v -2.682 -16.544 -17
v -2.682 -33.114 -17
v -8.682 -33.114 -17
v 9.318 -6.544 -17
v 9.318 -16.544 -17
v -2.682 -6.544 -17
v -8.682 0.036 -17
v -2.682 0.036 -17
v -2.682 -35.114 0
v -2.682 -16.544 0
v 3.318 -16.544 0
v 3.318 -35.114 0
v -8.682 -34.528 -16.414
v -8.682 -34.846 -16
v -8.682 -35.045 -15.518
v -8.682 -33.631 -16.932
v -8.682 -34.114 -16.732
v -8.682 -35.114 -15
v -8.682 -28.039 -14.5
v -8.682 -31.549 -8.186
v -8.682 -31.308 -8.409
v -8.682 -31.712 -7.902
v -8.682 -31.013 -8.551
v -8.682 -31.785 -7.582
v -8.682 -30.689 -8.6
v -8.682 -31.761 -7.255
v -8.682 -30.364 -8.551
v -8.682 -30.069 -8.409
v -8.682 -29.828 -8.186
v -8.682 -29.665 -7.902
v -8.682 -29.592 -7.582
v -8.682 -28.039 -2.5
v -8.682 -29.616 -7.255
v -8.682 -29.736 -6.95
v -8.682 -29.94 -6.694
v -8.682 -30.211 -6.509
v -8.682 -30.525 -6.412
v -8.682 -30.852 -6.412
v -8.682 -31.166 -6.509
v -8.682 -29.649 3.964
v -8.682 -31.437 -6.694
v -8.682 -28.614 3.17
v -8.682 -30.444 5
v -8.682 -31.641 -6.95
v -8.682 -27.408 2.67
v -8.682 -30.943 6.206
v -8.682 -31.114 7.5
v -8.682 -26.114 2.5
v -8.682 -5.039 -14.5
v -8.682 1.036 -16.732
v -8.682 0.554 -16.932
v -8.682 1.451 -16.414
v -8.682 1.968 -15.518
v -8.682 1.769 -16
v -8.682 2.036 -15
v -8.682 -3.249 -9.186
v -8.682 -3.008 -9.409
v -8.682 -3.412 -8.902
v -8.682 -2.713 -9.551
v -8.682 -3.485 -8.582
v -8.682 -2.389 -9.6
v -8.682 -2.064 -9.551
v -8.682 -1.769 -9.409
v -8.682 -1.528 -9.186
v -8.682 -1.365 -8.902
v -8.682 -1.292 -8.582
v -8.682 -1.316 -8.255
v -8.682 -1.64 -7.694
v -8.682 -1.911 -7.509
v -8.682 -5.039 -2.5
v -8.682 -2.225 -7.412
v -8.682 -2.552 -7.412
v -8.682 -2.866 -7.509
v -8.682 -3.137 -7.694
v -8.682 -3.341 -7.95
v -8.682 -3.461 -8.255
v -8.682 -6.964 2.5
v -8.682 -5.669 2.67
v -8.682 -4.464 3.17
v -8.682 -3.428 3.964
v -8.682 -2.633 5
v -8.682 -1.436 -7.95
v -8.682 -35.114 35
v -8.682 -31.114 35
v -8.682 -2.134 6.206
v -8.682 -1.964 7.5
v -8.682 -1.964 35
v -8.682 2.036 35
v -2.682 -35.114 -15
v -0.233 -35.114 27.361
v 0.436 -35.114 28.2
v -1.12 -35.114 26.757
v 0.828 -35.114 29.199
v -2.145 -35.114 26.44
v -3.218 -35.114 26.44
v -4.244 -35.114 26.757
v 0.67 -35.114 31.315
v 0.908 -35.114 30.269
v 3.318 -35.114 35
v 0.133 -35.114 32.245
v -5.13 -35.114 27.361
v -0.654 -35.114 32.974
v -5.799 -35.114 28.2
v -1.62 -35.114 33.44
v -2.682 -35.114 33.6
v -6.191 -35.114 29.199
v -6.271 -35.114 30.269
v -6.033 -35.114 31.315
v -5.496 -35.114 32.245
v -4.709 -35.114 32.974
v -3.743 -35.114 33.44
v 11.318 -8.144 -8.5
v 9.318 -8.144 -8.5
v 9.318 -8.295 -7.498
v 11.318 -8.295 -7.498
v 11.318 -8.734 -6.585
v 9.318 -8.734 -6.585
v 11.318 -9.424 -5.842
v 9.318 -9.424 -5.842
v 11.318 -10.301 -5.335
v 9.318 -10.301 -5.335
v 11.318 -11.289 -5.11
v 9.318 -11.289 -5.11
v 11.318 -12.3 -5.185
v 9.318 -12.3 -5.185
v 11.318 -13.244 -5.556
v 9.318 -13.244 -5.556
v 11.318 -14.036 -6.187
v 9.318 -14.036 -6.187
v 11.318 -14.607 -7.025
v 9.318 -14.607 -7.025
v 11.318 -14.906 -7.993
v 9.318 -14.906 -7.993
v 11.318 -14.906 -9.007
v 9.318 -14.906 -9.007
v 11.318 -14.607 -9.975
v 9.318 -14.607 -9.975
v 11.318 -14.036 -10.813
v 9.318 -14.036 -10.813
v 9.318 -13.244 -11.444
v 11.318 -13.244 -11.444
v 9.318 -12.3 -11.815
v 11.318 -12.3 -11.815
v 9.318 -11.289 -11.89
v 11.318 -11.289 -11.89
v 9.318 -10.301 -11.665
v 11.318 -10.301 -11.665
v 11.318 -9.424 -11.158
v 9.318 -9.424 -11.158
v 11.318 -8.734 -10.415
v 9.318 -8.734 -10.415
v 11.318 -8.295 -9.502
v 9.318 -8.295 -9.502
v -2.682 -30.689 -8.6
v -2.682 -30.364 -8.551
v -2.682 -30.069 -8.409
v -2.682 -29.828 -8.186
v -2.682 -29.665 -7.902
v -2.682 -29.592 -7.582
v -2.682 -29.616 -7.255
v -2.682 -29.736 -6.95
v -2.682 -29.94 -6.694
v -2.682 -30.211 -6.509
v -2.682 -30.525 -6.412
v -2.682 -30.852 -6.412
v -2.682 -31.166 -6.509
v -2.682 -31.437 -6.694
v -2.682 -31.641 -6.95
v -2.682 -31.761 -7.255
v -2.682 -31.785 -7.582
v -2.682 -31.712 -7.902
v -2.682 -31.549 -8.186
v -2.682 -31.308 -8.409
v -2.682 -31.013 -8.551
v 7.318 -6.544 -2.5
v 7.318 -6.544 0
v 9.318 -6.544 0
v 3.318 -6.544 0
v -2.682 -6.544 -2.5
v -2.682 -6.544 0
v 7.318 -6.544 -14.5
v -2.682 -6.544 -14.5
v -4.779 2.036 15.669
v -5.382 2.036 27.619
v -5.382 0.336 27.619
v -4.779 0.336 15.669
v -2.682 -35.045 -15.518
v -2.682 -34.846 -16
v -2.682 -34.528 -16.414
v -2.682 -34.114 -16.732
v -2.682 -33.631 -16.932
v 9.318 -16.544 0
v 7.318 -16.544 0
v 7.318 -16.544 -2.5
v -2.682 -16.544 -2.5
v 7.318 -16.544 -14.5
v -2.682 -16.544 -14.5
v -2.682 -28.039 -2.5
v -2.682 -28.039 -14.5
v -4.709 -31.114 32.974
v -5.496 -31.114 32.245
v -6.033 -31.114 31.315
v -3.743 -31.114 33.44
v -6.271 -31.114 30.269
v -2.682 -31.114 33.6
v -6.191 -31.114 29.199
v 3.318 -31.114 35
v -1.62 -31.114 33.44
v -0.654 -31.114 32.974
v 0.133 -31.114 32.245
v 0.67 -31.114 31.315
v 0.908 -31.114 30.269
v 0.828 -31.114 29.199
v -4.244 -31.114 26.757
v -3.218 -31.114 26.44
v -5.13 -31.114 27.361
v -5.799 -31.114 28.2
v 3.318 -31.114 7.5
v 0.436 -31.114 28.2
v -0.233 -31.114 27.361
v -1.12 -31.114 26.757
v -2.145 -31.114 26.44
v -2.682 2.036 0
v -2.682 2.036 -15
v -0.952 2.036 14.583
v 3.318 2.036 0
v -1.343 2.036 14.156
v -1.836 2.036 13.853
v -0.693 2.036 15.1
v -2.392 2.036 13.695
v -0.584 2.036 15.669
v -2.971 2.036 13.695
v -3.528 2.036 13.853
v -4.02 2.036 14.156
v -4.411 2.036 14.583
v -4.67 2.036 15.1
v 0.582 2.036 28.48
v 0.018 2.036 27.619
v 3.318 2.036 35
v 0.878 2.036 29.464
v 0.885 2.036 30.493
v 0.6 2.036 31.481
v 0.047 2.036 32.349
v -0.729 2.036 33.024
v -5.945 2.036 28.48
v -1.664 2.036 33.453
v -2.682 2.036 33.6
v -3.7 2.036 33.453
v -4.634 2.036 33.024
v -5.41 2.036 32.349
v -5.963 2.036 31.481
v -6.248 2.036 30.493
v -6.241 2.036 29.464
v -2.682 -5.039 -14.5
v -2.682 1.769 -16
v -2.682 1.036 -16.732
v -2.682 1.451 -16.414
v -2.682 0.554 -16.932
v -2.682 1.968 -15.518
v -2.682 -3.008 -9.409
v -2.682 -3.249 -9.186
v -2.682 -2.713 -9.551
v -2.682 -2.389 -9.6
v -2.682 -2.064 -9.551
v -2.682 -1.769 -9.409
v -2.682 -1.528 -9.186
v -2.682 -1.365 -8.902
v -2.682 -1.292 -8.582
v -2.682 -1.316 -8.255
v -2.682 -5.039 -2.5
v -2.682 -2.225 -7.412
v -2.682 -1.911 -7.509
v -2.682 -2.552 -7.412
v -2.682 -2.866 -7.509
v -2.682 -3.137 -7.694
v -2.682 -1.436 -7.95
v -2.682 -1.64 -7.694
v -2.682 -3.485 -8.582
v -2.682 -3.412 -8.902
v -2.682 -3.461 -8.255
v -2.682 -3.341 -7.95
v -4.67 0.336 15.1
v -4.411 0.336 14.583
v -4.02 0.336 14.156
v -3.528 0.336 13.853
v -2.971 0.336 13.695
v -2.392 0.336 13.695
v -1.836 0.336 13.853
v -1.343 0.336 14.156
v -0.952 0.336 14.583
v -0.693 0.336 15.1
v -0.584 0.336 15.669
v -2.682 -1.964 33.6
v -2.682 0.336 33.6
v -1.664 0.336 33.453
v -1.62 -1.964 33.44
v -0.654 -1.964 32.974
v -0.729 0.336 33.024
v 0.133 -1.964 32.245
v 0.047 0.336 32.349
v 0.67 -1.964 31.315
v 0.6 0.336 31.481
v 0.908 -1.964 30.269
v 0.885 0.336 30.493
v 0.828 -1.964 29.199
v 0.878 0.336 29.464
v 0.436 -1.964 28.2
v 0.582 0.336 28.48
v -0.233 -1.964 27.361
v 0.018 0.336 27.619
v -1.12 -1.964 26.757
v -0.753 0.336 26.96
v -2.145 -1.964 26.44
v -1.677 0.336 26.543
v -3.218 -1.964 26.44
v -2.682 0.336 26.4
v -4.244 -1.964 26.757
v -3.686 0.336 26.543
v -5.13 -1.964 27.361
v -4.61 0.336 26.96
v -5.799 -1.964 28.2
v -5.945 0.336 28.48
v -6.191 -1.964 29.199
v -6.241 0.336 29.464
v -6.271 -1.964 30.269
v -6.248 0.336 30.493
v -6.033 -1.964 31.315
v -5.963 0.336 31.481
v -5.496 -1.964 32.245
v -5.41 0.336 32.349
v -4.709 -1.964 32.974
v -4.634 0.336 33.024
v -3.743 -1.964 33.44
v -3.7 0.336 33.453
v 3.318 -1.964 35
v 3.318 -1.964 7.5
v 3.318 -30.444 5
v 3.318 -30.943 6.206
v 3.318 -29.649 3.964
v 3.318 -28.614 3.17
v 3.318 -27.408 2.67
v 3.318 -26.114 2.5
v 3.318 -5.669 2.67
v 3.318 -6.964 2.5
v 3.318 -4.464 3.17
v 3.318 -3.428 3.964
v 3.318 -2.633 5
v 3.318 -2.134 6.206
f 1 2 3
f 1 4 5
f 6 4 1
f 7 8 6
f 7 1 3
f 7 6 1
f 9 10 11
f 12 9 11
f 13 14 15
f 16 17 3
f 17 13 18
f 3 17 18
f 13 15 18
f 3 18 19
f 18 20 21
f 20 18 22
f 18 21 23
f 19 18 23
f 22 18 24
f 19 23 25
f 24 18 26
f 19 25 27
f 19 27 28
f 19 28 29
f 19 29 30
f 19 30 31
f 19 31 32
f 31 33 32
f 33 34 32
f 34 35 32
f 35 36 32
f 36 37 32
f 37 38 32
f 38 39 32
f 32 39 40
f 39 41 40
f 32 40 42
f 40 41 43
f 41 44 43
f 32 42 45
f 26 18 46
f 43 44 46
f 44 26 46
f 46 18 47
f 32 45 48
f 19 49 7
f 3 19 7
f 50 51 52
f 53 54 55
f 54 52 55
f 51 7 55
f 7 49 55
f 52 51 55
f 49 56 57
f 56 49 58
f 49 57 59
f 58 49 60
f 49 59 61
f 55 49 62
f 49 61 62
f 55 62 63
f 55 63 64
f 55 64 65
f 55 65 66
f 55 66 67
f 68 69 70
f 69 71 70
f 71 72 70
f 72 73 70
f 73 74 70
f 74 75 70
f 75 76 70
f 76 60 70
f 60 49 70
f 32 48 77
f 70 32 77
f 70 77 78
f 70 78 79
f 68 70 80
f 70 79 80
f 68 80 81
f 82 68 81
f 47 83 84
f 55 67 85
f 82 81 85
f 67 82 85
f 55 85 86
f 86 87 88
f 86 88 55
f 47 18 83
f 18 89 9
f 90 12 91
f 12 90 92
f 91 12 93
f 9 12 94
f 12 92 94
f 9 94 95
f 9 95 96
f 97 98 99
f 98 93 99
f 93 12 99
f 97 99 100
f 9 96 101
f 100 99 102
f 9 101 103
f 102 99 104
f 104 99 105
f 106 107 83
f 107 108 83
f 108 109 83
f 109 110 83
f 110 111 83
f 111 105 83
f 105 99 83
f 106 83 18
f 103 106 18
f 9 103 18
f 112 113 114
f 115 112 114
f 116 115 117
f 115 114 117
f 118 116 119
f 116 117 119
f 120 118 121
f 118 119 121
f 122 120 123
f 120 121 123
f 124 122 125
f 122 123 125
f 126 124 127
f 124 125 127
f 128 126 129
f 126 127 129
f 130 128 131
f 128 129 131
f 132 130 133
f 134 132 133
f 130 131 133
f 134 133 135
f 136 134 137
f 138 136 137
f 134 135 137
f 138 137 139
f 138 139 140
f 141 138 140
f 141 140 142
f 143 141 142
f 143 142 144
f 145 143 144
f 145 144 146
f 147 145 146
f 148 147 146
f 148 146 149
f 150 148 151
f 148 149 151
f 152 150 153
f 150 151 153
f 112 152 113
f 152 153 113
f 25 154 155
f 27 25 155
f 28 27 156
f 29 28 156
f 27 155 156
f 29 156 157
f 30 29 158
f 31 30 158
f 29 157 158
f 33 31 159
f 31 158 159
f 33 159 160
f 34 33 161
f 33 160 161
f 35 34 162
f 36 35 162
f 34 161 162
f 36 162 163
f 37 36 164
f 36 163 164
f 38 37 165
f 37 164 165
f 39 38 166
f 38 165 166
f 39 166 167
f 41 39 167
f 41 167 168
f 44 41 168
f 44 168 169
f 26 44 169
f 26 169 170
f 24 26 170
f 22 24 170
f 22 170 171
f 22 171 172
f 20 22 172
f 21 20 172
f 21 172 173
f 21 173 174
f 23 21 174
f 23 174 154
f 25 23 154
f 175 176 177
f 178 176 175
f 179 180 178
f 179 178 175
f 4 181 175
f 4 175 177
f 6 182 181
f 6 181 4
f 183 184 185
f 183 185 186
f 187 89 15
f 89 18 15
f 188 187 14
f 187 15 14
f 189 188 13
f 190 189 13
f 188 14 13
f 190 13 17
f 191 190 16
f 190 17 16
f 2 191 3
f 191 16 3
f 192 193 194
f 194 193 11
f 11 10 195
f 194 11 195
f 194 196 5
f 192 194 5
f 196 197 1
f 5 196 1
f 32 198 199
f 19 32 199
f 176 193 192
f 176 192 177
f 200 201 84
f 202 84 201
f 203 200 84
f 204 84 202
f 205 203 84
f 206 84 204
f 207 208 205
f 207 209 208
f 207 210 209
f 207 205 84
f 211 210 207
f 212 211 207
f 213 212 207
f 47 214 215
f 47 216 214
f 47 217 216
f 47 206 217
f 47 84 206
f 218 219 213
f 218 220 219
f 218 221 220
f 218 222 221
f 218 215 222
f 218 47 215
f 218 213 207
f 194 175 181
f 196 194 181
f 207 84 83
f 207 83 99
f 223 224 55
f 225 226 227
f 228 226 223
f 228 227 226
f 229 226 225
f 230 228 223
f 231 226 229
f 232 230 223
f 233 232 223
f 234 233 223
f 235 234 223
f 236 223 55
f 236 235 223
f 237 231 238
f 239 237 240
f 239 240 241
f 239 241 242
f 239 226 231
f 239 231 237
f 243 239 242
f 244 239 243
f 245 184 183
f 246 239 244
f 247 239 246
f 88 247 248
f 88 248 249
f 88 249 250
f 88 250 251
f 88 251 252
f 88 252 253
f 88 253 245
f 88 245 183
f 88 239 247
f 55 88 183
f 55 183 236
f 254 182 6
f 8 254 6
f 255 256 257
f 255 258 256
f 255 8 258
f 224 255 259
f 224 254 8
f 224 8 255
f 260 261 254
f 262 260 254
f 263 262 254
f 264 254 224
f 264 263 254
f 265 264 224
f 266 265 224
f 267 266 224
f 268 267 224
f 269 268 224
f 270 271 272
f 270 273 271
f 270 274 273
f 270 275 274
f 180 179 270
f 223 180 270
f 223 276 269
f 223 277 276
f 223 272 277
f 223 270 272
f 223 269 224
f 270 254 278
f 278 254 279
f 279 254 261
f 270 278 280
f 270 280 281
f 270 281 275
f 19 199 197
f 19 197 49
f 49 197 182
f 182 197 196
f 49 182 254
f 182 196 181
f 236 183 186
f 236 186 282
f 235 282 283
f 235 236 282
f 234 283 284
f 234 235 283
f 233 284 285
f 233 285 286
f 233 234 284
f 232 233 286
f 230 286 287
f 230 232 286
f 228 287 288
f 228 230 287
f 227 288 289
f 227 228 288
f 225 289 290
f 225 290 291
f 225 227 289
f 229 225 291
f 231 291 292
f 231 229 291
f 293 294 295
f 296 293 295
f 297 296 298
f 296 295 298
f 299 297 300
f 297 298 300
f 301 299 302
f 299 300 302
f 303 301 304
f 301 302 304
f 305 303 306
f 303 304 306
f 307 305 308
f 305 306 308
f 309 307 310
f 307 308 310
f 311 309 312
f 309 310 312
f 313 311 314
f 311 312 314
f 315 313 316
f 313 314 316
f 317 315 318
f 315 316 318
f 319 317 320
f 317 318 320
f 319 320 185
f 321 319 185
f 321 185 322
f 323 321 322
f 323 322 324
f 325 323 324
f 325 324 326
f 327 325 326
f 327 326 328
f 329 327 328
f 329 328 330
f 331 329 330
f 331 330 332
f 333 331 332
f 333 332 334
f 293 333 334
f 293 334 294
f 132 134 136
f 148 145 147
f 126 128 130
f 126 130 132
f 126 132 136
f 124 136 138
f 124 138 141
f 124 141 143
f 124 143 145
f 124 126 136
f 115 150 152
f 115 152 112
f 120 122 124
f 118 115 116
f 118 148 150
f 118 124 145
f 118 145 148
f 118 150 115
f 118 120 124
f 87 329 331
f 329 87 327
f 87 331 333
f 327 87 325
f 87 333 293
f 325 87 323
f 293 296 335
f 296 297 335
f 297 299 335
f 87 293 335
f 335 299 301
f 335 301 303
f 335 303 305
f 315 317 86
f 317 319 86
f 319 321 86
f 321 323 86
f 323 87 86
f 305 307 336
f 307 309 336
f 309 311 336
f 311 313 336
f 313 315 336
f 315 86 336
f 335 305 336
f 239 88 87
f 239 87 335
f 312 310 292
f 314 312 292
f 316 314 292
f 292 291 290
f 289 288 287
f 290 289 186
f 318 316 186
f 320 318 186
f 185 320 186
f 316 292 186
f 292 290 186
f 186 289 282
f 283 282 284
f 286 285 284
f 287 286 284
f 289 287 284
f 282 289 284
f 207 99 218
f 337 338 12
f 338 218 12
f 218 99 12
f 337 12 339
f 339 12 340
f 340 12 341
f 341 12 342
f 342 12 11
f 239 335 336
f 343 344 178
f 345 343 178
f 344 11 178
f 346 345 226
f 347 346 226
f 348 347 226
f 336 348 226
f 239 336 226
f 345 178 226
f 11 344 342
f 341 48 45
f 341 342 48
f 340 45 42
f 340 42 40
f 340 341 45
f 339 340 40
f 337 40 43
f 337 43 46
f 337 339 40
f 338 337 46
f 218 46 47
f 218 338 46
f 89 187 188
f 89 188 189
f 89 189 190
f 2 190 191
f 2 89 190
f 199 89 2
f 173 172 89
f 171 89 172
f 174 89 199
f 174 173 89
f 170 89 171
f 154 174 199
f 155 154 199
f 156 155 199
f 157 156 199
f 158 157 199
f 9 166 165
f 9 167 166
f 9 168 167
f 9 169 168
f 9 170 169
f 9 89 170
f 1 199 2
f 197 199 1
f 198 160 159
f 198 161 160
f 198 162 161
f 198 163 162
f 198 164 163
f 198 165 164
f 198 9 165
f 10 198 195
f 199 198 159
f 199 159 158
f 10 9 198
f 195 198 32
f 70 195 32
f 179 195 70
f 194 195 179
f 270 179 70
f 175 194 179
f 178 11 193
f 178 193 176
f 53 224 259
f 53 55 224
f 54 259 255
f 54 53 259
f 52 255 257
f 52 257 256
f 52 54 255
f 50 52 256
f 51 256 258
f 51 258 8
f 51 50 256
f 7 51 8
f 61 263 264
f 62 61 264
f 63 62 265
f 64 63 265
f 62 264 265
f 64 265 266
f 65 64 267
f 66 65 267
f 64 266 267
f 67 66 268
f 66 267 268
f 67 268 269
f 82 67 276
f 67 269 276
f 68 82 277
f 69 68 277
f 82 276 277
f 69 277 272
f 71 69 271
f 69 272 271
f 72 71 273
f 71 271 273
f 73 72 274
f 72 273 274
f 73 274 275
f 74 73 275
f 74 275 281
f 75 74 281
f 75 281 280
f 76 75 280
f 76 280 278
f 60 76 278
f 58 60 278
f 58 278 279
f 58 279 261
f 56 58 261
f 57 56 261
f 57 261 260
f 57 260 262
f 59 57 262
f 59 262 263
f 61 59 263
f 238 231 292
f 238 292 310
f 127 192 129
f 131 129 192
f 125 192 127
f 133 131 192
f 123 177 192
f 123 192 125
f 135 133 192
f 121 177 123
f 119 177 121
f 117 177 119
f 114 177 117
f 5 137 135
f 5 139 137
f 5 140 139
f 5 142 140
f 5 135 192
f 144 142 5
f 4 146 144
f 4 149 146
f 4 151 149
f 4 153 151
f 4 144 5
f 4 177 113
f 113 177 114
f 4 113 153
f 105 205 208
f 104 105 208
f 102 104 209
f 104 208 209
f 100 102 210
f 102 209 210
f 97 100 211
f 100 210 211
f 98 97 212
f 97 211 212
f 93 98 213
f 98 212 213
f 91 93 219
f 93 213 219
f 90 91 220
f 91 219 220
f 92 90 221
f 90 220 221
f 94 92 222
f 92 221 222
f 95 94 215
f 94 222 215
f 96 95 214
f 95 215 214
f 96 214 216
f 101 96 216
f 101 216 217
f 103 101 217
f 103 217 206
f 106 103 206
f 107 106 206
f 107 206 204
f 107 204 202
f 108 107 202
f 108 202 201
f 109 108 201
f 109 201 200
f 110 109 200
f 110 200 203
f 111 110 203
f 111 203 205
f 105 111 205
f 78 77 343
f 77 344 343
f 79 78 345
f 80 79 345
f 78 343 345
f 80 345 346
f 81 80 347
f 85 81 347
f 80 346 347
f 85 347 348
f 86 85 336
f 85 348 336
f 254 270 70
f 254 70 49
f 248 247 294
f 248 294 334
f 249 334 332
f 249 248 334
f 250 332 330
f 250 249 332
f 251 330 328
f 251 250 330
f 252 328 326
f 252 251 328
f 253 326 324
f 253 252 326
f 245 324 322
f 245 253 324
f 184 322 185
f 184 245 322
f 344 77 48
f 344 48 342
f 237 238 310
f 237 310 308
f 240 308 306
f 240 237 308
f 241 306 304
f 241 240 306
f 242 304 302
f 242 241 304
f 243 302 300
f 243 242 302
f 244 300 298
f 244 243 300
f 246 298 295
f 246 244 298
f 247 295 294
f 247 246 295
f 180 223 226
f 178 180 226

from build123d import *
from build123d.topology import SkipClean

# Parameters (mm, degrees)
SKETCH2_W             = 12
SKETCH2_H             = 4
BOSS_EXTRUDE2_DEPTH   = 35
BOSS_EXTRUDE2_2_DEPTH = 35
SKETCH2_3_W           = 12
SKETCH2_3_H           = 29.15
BOSS_EXTRUDE3_DEPTH   = 2.5
SKETCH7_W             = 6
SKETCH7_H             = 37.15
BOSS_EXTRUDE4_DEPTH   = 17
CUT_EXTRUDE5_REACH    = 51.94
SKETCH8_R             = 1.1
SKETCH8_W             = 12
SKETCH8_H             = 23
CUT_EXTRUDE6_DEPTH    = 1.7
SKETCH10_R            = 3.6
CUT_EXTRUDE7_DEPTH    = 52.773465505
FILLET6_R             = 5
FILLET7_R             = 5
SKETCH12_W            = 2.5
SKETCH12_H            = 10
BOSS_EXTRUDE5_DEPTH   = 10
SKETCH13_W            = 17
SKETCH13_H            = 10
BOSS_EXTRUDE6_DEPTH   = 2
SKETCH14_R            = 3.4
BOSS_EXTRUDE7_DEPTH   = 2
FILLET8_R             = 2
FILLET9_R             = 2


with BuildPart() as part:
    # Sketch2 → Boss-Extrude2 (new body)
    with BuildSketch(Plane.XY):
        with Locations((-2.681545395, 0.036493048)):
            Rectangle(SKETCH2_W, SKETCH2_H)
    extrude(amount=BOSS_EXTRUDE2_DEPTH)

    # Sketch2<3> → Boss-Extrude3 (add)
    with BuildSketch(Plane.XY):
        with Locations((-2.681545395, -16.538506952)):
            Rectangle(SKETCH2_3_W, SKETCH2_3_H)
    extrude(amount=BOSS_EXTRUDE3_DEPTH)



with BuildPart() as body_2:
    # Sketch2 → Boss-Extrude2 2 (new body)
    with BuildSketch(Plane.XY):
        with Locations((-2.681545395, -33.113506952)):
            Rectangle(SKETCH2_W, SKETCH2_H)
    extrude(amount=BOSS_EXTRUDE2_2_DEPTH)


with BuildPart() as part_1:
    add(part.part)

    add(body_2.part)  # Boss-Extrude4 merges body 2
    # Sketch7 → Boss-Extrude4 (add)
    with BuildSketch(Plane(origin=(0, 0, 0), x_dir=(-1, 0, 0), z_dir=(0, 0, -1))):
        with Locations((5.681545395, -16.538506952)):
            Rectangle(SKETCH7_W, SKETCH7_H)
    extrude(amount=BOSS_EXTRUDE4_DEPTH)

    # Sketch8 → Cut-Extrude5 (cut, up to next)
    with BuildSketch(Plane(origin=(-2.681545395, 0, 0), x_dir=(0, 0, -1), z_dir=(1, 0, 0)), mode=Mode.PRIVATE) as cut_extrude5_sk1:
        with Locations((8.5, -2.388506952)):
            Circle(SKETCH8_R)
    cut_extrude5_tool1 = extrude(cut_extrude5_sk1.sketch, amount=-CUT_EXTRUDE5_REACH, mode=Mode.PRIVATE) & part_1.part
    # Sketch8 → Cut-Extrude5 (cut, up to next)
    with BuildSketch(Plane(origin=(-2.681545395, 0, 0), x_dir=(0, 0, -1), z_dir=(1, 0, 0)), mode=Mode.PRIVATE) as cut_extrude5_sk2:
        with Locations((7.5, -30.688506952)):
            Circle(SKETCH8_R)
    cut_extrude5_tool2 = extrude(cut_extrude5_sk2.sketch, amount=-CUT_EXTRUDE5_REACH, mode=Mode.PRIVATE) & part_1.part
    # Sketch8 → Cut-Extrude5 (cut, up to next)
    with BuildSketch(Plane(origin=(-2.681545395, 0, 0), x_dir=(0, 0, -1), z_dir=(1, 0, 0)), mode=Mode.PRIVATE) as cut_extrude5_sk3:
        with Locations((8.5, -16.538506952)):
            Rectangle(SKETCH8_W, SKETCH8_H)
    cut_extrude5_tool3 = extrude(cut_extrude5_sk3.sketch, amount=-CUT_EXTRUDE5_REACH, mode=Mode.PRIVATE) & part_1.part
    add(cut_extrude5_tool1.solids().sort_by_distance((-2.681545, -2.388507, -8.5))[0], mode=Mode.SUBTRACT)
    add(cut_extrude5_tool2.solids().sort_by_distance((-2.681545, -30.688507, -7.5))[0], mode=Mode.SUBTRACT)
    add(cut_extrude5_tool3.solids().sort_by_distance((-2.681545, -16.538507, -8.5))[0], mode=Mode.SUBTRACT)

    # Sketch9 → Cut-Extrude6 (cut)
    with BuildSketch(Plane(origin=(0, 2.036493048, 0), x_dir=(1, 0, 0), z_dir=(0, 1, 0))):
        with BuildLine():
            Line((-0.584210872, -15.668774056), (0.018454605, -27.61882382))
            ThreePointArc((0.018454605, -27.61882382), (-2.681545395, -33.6), (-5.381545395, -27.61882382))
            Line((-5.381545395, -27.61882382), (-4.778879917, -15.668774056))
            ThreePointArc((-4.778879917, -15.668774056), (-2.681545395, -13.674546931), (-0.584210872, -15.668774056))
        make_face()
    extrude(amount=-CUT_EXTRUDE6_DEPTH, mode=Mode.SUBTRACT)

    # Sketch10 → Cut-Extrude7 (cut, through all)
    with BuildSketch(Plane(origin=(0, 2.036493048, 0), x_dir=(1, 0, 0), z_dir=(0, 1, 0))):
        with Locations((-2.681545395, -30)):
            Circle(SKETCH10_R)
    extrude(amount=-CUT_EXTRUDE7_DEPTH, mode=Mode.SUBTRACT)

    # Fillet6
    fillet6_edges = [part_1.edges().sort_by_distance(p)[0] for p in [
        (-2.681545395, -1.963506952, 2.5),
    ]]
    fillet(fillet6_edges, radius=FILLET6_R)

    # Fillet7
    fillet7_edges = [part_1.edges().sort_by_distance(p)[0] for p in [
        (-2.681545395, -31.113506952, 2.5),
    ]]
    fillet(fillet7_edges, radius=FILLET7_R)

    # Sketch12 → Boss-Extrude5 (add)
    with SkipClean():  # the faces are left unmerged after this step: merging them gives an invalid solid
        with BuildSketch(Plane(origin=(-2.681545395, 0, 0), x_dir=(0, 0, -1), z_dir=(1, 0, 0))):
            with Locations((1.25, -11.543506952)):
                Rectangle(SKETCH12_W, SKETCH12_H)
            with Locations((15.75, -11.543506952)):
                Rectangle(SKETCH12_W, SKETCH12_H)
        extrude(amount=BOSS_EXTRUDE5_DEPTH)

    # Sketch13 → Boss-Extrude6 (add)
    with SkipClean():  # the faces are left unmerged after this step: merging them gives an invalid solid
        with BuildSketch(Plane(origin=(7.318454605, 0, 0), x_dir=(0, 0, -1), z_dir=(1, 0, 0))):
            with Locations((8.5, -11.543506952)):
                Rectangle(SKETCH13_W, SKETCH13_H)
        extrude(amount=BOSS_EXTRUDE6_DEPTH)

    # Sketch14 → Boss-Extrude7 (add)
    with SkipClean():  # the faces are left unmerged after this step: merging them gives an invalid solid
        with BuildSketch(Plane(origin=(9.318454605, 0, 0), x_dir=(0, 0, -1), z_dir=(1, 0, 0))):
            with Locations((8.5, -11.543506952)):
                Circle(SKETCH14_R)
        extrude(amount=BOSS_EXTRUDE7_DEPTH)

    # Fillet8
    fillet8_edges = [part_1.edges().sort_by_distance(p)[0] for p in [
        (-5.681545395, 2.036493048, -17),
    ]]
    fillet(fillet8_edges, radius=FILLET8_R)

    # Fillet9
    fillet9_edges = [part_1.edges().sort_by_distance(p)[0] for p in [
        (-5.681545395, -35.113506952, -17),
    ]]
    fillet(fillet9_edges, radius=FILLET9_R)


solid = part_1.part
